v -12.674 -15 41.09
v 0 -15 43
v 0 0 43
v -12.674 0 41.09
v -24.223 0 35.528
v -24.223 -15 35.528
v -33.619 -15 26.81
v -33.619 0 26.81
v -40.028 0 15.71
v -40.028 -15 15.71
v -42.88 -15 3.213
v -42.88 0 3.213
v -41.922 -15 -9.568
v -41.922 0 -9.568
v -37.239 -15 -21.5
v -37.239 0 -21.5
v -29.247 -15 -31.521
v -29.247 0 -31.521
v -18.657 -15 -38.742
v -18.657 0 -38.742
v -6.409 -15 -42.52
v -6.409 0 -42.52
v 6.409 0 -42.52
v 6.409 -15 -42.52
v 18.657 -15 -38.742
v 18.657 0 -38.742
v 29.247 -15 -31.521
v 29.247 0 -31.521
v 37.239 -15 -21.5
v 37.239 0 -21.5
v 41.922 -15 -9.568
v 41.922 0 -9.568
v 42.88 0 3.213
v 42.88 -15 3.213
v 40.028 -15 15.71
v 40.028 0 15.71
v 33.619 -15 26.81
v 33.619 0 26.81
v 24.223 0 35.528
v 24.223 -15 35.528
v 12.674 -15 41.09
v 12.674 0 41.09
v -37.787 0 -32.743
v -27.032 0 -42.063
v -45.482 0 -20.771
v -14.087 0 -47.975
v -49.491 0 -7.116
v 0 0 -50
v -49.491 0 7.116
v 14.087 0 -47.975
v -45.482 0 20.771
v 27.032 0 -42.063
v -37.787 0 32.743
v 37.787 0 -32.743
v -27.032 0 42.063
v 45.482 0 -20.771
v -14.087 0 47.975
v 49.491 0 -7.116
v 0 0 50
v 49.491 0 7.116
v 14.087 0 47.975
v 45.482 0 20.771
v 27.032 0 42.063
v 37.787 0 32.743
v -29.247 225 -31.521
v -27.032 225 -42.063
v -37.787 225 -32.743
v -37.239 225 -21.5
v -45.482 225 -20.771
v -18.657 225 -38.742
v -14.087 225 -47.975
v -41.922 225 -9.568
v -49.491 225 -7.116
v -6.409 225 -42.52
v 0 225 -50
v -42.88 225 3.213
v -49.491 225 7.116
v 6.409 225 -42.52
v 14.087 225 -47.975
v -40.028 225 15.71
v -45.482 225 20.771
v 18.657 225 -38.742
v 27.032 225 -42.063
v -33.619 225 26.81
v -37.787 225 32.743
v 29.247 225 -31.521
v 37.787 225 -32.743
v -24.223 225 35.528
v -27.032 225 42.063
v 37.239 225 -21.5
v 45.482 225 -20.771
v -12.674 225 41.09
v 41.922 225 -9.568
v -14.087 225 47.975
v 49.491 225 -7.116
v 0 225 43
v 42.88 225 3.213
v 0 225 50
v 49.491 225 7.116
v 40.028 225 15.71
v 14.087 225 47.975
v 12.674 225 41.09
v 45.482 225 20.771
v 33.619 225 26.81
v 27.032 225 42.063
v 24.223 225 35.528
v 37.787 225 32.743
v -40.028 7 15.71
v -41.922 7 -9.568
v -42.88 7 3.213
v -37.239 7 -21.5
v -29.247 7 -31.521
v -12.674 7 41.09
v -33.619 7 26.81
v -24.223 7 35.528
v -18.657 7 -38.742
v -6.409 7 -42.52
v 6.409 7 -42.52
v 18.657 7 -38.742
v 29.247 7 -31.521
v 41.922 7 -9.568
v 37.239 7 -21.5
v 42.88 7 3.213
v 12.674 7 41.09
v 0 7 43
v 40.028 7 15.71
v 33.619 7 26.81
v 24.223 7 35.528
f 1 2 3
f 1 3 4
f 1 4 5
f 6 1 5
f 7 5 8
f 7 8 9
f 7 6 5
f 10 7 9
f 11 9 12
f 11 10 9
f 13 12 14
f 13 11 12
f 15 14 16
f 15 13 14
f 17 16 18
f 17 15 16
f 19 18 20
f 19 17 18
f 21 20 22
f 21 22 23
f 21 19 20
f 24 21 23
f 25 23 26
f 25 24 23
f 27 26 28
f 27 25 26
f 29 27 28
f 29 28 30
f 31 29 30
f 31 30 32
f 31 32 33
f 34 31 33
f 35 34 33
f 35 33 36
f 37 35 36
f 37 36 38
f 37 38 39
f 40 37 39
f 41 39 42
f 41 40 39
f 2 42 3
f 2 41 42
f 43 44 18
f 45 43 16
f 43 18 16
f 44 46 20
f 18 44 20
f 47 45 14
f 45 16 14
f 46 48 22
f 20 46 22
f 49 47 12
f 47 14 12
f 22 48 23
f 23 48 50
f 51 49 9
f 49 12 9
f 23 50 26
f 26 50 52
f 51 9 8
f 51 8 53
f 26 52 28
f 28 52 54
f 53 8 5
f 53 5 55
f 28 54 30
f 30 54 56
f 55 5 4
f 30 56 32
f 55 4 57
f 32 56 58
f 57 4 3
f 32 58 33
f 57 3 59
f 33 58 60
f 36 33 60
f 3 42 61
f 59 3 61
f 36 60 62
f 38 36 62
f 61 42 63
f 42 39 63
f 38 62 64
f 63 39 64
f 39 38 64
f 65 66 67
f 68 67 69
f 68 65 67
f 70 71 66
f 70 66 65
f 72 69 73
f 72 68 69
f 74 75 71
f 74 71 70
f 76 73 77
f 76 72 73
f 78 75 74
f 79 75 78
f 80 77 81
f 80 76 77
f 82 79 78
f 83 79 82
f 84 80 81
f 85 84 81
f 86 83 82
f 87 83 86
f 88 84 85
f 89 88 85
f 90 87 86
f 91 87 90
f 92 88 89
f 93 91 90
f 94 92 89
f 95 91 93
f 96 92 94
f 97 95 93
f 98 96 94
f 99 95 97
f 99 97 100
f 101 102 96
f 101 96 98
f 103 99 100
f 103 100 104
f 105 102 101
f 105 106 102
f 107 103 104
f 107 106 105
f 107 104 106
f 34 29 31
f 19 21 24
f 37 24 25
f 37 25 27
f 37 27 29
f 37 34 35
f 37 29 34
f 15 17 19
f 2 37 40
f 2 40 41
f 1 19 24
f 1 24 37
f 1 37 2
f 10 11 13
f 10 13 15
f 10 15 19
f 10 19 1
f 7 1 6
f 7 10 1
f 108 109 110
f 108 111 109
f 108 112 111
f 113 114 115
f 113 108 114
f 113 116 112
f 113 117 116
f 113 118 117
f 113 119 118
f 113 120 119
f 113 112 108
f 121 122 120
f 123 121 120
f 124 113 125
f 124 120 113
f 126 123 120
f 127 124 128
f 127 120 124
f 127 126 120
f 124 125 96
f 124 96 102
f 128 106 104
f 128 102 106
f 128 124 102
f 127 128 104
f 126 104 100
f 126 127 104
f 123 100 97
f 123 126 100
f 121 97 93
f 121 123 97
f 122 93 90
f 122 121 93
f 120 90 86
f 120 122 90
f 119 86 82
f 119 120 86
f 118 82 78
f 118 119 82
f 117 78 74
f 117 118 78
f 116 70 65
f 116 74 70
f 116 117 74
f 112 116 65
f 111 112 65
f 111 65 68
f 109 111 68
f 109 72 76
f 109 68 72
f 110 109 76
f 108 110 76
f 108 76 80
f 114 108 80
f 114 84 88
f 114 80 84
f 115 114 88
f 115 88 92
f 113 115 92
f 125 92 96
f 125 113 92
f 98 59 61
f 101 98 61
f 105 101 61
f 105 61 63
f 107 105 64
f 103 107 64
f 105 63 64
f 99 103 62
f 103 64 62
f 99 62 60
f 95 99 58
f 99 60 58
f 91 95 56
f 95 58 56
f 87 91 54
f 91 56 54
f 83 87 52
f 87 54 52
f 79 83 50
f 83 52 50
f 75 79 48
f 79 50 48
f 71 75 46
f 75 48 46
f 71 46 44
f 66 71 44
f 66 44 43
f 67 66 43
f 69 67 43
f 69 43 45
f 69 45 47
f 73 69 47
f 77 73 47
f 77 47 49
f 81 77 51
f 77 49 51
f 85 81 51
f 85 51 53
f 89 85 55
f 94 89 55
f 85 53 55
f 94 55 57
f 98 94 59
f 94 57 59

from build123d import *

# Parameters (mm, degrees)
SKETCH1_R           = 50
BOSS_EXTRUDE1_DEPTH = 225
SHELL1_T            = -7
BOSS_EXTRUDE2_START = 15
SKETCH2_R           = 43
BOSS_EXTRUDE2_DEPTH = 15


with BuildPart() as part:
    # Sketch1 → Boss-Extrude1 (new body)
    with BuildSketch(Plane(origin=(0, 0, 0), x_dir=(1, 0, 0), z_dir=(0, 1, 0))):
        with Locations(Location((0, 0, 0), (0, 0, 270))):
            Circle(SKETCH1_R)
    extrude(amount=BOSS_EXTRUDE1_DEPTH)

    # Shell1
    shell1_openings = [part.faces().sort_by_distance(p)[0] for p in [
        (0, 225, 0),
    ]]
    offset(amount=SHELL1_T, openings=shell1_openings, kind=Kind.INTERSECTION)

    # Sketch2 → Boss-Extrude2 (add)
    with BuildSketch(Plane.XZ.offset(BOSS_EXTRUDE2_START)):
        with Locations(Location((0, 0, 0), (0, 0, 90))):
            Circle(SKETCH2_R)
    extrude(amount=-BOSS_EXTRUDE2_DEPTH)


solid = part.part
